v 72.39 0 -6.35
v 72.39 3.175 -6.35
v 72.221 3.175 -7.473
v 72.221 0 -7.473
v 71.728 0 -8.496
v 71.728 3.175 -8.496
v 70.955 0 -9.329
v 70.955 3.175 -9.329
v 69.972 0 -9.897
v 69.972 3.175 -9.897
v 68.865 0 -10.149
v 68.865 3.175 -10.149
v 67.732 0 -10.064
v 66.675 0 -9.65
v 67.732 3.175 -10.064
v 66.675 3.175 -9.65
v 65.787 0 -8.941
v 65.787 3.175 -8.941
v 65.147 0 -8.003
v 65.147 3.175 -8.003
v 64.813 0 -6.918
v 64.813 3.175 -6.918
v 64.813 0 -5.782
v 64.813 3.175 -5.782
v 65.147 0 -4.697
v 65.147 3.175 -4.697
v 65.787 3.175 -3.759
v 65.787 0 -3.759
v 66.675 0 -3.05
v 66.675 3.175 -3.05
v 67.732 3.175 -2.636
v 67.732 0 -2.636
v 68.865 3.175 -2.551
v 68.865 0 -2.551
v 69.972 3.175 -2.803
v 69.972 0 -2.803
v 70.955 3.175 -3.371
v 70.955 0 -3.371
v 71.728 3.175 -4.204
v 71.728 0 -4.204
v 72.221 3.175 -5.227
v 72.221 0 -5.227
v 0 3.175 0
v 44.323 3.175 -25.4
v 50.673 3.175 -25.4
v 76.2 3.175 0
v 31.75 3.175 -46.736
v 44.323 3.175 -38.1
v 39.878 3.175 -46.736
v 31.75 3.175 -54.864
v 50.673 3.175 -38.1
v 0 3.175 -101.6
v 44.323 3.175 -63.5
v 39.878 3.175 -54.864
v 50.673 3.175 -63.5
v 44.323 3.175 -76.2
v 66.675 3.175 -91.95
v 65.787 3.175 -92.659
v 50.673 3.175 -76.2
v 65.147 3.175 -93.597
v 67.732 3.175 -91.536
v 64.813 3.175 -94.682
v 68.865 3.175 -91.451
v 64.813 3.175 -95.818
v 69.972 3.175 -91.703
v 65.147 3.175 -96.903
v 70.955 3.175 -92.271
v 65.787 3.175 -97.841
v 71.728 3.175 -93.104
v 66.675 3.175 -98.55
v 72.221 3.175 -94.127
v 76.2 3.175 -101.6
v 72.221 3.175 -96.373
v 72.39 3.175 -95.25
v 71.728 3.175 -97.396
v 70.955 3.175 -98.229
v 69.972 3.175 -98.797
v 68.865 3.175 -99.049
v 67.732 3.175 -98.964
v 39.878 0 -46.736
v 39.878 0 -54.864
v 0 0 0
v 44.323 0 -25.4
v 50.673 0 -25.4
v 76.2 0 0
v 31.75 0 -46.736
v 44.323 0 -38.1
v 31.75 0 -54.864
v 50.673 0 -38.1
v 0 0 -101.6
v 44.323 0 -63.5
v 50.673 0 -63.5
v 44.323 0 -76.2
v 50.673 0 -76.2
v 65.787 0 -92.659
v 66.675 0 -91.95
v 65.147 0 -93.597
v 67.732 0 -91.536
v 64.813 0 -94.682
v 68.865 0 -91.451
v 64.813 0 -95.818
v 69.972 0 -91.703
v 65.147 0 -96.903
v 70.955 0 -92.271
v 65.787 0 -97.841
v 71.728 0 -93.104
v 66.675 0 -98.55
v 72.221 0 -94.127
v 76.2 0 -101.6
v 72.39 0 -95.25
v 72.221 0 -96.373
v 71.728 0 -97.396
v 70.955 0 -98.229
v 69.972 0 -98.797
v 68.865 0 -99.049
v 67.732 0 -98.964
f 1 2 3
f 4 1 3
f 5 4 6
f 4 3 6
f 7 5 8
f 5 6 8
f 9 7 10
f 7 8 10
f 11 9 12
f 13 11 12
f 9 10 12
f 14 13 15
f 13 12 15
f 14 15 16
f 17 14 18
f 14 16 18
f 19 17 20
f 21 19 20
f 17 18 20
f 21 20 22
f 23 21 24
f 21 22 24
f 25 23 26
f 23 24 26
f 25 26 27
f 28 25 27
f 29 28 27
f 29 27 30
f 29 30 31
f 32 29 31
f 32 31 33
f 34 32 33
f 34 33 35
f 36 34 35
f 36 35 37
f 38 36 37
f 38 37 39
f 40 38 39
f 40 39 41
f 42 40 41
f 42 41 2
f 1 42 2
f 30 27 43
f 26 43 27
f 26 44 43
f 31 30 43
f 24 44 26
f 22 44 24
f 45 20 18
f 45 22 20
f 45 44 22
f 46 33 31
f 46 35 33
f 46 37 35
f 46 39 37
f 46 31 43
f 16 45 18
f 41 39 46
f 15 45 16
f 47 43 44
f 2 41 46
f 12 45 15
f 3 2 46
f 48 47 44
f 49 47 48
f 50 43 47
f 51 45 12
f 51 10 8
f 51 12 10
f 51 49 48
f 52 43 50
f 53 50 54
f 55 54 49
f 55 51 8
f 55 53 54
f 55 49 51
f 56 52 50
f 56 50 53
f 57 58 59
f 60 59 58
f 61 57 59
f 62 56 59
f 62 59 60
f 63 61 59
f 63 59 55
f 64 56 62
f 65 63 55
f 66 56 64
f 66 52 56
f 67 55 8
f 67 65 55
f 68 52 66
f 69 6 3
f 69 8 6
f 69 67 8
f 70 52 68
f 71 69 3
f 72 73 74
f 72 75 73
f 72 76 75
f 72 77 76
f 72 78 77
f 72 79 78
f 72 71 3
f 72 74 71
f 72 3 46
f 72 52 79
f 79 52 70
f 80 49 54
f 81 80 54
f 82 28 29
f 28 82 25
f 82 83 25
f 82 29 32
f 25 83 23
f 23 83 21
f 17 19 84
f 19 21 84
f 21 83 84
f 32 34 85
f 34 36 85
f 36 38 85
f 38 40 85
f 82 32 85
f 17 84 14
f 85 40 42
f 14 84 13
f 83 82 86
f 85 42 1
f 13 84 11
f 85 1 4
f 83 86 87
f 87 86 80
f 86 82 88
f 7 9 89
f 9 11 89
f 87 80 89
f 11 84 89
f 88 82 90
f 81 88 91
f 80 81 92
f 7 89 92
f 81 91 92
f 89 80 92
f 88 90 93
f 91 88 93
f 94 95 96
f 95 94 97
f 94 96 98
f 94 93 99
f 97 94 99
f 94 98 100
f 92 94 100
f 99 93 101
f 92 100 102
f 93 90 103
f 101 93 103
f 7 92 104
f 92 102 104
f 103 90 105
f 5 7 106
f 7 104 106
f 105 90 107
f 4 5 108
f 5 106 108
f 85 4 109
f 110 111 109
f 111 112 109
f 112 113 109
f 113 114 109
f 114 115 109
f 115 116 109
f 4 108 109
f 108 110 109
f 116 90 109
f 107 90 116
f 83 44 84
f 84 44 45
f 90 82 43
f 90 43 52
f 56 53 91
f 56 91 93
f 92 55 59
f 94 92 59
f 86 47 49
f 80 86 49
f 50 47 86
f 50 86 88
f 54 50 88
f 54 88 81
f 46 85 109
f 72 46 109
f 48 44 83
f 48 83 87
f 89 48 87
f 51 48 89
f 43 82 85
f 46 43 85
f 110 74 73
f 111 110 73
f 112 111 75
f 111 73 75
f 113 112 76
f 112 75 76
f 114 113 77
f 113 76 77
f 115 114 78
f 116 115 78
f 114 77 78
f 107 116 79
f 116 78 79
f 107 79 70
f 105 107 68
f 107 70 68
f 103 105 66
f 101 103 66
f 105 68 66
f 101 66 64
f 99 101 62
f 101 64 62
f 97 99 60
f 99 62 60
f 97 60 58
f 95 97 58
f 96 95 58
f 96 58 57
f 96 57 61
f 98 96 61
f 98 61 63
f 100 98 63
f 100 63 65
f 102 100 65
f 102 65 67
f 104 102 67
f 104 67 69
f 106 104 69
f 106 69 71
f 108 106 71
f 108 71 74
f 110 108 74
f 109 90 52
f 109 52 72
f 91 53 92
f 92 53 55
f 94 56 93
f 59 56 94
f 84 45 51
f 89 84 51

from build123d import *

# Parameters (mm, degrees)
SKETCH1_W           = 76.2
SKETCH1_H           = 101.6
BOSS_EXTRUDE1_DEPTH = 3.175
SKETCH2_R           = 3.81
SKETCH2_W           = 6.35
SKETCH2_H           = 12.7
SKETCH2_W_2         = 8.128
SKETCH2_H_2         = 8.128
CUT_EXTRUDE1_DEPTH  = 4.175


with BuildPart() as part:
    # Sketch1 → Boss-Extrude1 (new body)
    with BuildSketch(Plane(origin=(0, 0, 0), x_dir=(1, 0, 0), z_dir=(0, 1, 0))):
        with Locations((38.1, 50.8)):
            Rectangle(SKETCH1_W, SKETCH1_H)
    extrude(amount=BOSS_EXTRUDE1_DEPTH)

    # Sketch2 → Cut-Extrude1 (cut, through all)
    with BuildSketch(Plane(origin=(0, 3.175, 0), x_dir=(1, 0, 0), z_dir=(0, 1, 0))):
        with Locations((68.58, 95.25)):
            Circle(SKETCH2_R)
        with Locations((68.58, 6.35)):
            Circle(SKETCH2_R)
        with Locations((47.498, 69.85)):
            Rectangle(SKETCH2_W, SKETCH2_H)
        with Locations((47.498, 31.75)):
            Rectangle(SKETCH2_W, SKETCH2_H)
        with Locations((35.814, 50.8)):
            Rectangle(SKETCH2_W_2, SKETCH2_H_2)
    extrude(amount=-CUT_EXTRUDE1_DEPTH, mode=Mode.SUBTRACT)


solid = part.part
